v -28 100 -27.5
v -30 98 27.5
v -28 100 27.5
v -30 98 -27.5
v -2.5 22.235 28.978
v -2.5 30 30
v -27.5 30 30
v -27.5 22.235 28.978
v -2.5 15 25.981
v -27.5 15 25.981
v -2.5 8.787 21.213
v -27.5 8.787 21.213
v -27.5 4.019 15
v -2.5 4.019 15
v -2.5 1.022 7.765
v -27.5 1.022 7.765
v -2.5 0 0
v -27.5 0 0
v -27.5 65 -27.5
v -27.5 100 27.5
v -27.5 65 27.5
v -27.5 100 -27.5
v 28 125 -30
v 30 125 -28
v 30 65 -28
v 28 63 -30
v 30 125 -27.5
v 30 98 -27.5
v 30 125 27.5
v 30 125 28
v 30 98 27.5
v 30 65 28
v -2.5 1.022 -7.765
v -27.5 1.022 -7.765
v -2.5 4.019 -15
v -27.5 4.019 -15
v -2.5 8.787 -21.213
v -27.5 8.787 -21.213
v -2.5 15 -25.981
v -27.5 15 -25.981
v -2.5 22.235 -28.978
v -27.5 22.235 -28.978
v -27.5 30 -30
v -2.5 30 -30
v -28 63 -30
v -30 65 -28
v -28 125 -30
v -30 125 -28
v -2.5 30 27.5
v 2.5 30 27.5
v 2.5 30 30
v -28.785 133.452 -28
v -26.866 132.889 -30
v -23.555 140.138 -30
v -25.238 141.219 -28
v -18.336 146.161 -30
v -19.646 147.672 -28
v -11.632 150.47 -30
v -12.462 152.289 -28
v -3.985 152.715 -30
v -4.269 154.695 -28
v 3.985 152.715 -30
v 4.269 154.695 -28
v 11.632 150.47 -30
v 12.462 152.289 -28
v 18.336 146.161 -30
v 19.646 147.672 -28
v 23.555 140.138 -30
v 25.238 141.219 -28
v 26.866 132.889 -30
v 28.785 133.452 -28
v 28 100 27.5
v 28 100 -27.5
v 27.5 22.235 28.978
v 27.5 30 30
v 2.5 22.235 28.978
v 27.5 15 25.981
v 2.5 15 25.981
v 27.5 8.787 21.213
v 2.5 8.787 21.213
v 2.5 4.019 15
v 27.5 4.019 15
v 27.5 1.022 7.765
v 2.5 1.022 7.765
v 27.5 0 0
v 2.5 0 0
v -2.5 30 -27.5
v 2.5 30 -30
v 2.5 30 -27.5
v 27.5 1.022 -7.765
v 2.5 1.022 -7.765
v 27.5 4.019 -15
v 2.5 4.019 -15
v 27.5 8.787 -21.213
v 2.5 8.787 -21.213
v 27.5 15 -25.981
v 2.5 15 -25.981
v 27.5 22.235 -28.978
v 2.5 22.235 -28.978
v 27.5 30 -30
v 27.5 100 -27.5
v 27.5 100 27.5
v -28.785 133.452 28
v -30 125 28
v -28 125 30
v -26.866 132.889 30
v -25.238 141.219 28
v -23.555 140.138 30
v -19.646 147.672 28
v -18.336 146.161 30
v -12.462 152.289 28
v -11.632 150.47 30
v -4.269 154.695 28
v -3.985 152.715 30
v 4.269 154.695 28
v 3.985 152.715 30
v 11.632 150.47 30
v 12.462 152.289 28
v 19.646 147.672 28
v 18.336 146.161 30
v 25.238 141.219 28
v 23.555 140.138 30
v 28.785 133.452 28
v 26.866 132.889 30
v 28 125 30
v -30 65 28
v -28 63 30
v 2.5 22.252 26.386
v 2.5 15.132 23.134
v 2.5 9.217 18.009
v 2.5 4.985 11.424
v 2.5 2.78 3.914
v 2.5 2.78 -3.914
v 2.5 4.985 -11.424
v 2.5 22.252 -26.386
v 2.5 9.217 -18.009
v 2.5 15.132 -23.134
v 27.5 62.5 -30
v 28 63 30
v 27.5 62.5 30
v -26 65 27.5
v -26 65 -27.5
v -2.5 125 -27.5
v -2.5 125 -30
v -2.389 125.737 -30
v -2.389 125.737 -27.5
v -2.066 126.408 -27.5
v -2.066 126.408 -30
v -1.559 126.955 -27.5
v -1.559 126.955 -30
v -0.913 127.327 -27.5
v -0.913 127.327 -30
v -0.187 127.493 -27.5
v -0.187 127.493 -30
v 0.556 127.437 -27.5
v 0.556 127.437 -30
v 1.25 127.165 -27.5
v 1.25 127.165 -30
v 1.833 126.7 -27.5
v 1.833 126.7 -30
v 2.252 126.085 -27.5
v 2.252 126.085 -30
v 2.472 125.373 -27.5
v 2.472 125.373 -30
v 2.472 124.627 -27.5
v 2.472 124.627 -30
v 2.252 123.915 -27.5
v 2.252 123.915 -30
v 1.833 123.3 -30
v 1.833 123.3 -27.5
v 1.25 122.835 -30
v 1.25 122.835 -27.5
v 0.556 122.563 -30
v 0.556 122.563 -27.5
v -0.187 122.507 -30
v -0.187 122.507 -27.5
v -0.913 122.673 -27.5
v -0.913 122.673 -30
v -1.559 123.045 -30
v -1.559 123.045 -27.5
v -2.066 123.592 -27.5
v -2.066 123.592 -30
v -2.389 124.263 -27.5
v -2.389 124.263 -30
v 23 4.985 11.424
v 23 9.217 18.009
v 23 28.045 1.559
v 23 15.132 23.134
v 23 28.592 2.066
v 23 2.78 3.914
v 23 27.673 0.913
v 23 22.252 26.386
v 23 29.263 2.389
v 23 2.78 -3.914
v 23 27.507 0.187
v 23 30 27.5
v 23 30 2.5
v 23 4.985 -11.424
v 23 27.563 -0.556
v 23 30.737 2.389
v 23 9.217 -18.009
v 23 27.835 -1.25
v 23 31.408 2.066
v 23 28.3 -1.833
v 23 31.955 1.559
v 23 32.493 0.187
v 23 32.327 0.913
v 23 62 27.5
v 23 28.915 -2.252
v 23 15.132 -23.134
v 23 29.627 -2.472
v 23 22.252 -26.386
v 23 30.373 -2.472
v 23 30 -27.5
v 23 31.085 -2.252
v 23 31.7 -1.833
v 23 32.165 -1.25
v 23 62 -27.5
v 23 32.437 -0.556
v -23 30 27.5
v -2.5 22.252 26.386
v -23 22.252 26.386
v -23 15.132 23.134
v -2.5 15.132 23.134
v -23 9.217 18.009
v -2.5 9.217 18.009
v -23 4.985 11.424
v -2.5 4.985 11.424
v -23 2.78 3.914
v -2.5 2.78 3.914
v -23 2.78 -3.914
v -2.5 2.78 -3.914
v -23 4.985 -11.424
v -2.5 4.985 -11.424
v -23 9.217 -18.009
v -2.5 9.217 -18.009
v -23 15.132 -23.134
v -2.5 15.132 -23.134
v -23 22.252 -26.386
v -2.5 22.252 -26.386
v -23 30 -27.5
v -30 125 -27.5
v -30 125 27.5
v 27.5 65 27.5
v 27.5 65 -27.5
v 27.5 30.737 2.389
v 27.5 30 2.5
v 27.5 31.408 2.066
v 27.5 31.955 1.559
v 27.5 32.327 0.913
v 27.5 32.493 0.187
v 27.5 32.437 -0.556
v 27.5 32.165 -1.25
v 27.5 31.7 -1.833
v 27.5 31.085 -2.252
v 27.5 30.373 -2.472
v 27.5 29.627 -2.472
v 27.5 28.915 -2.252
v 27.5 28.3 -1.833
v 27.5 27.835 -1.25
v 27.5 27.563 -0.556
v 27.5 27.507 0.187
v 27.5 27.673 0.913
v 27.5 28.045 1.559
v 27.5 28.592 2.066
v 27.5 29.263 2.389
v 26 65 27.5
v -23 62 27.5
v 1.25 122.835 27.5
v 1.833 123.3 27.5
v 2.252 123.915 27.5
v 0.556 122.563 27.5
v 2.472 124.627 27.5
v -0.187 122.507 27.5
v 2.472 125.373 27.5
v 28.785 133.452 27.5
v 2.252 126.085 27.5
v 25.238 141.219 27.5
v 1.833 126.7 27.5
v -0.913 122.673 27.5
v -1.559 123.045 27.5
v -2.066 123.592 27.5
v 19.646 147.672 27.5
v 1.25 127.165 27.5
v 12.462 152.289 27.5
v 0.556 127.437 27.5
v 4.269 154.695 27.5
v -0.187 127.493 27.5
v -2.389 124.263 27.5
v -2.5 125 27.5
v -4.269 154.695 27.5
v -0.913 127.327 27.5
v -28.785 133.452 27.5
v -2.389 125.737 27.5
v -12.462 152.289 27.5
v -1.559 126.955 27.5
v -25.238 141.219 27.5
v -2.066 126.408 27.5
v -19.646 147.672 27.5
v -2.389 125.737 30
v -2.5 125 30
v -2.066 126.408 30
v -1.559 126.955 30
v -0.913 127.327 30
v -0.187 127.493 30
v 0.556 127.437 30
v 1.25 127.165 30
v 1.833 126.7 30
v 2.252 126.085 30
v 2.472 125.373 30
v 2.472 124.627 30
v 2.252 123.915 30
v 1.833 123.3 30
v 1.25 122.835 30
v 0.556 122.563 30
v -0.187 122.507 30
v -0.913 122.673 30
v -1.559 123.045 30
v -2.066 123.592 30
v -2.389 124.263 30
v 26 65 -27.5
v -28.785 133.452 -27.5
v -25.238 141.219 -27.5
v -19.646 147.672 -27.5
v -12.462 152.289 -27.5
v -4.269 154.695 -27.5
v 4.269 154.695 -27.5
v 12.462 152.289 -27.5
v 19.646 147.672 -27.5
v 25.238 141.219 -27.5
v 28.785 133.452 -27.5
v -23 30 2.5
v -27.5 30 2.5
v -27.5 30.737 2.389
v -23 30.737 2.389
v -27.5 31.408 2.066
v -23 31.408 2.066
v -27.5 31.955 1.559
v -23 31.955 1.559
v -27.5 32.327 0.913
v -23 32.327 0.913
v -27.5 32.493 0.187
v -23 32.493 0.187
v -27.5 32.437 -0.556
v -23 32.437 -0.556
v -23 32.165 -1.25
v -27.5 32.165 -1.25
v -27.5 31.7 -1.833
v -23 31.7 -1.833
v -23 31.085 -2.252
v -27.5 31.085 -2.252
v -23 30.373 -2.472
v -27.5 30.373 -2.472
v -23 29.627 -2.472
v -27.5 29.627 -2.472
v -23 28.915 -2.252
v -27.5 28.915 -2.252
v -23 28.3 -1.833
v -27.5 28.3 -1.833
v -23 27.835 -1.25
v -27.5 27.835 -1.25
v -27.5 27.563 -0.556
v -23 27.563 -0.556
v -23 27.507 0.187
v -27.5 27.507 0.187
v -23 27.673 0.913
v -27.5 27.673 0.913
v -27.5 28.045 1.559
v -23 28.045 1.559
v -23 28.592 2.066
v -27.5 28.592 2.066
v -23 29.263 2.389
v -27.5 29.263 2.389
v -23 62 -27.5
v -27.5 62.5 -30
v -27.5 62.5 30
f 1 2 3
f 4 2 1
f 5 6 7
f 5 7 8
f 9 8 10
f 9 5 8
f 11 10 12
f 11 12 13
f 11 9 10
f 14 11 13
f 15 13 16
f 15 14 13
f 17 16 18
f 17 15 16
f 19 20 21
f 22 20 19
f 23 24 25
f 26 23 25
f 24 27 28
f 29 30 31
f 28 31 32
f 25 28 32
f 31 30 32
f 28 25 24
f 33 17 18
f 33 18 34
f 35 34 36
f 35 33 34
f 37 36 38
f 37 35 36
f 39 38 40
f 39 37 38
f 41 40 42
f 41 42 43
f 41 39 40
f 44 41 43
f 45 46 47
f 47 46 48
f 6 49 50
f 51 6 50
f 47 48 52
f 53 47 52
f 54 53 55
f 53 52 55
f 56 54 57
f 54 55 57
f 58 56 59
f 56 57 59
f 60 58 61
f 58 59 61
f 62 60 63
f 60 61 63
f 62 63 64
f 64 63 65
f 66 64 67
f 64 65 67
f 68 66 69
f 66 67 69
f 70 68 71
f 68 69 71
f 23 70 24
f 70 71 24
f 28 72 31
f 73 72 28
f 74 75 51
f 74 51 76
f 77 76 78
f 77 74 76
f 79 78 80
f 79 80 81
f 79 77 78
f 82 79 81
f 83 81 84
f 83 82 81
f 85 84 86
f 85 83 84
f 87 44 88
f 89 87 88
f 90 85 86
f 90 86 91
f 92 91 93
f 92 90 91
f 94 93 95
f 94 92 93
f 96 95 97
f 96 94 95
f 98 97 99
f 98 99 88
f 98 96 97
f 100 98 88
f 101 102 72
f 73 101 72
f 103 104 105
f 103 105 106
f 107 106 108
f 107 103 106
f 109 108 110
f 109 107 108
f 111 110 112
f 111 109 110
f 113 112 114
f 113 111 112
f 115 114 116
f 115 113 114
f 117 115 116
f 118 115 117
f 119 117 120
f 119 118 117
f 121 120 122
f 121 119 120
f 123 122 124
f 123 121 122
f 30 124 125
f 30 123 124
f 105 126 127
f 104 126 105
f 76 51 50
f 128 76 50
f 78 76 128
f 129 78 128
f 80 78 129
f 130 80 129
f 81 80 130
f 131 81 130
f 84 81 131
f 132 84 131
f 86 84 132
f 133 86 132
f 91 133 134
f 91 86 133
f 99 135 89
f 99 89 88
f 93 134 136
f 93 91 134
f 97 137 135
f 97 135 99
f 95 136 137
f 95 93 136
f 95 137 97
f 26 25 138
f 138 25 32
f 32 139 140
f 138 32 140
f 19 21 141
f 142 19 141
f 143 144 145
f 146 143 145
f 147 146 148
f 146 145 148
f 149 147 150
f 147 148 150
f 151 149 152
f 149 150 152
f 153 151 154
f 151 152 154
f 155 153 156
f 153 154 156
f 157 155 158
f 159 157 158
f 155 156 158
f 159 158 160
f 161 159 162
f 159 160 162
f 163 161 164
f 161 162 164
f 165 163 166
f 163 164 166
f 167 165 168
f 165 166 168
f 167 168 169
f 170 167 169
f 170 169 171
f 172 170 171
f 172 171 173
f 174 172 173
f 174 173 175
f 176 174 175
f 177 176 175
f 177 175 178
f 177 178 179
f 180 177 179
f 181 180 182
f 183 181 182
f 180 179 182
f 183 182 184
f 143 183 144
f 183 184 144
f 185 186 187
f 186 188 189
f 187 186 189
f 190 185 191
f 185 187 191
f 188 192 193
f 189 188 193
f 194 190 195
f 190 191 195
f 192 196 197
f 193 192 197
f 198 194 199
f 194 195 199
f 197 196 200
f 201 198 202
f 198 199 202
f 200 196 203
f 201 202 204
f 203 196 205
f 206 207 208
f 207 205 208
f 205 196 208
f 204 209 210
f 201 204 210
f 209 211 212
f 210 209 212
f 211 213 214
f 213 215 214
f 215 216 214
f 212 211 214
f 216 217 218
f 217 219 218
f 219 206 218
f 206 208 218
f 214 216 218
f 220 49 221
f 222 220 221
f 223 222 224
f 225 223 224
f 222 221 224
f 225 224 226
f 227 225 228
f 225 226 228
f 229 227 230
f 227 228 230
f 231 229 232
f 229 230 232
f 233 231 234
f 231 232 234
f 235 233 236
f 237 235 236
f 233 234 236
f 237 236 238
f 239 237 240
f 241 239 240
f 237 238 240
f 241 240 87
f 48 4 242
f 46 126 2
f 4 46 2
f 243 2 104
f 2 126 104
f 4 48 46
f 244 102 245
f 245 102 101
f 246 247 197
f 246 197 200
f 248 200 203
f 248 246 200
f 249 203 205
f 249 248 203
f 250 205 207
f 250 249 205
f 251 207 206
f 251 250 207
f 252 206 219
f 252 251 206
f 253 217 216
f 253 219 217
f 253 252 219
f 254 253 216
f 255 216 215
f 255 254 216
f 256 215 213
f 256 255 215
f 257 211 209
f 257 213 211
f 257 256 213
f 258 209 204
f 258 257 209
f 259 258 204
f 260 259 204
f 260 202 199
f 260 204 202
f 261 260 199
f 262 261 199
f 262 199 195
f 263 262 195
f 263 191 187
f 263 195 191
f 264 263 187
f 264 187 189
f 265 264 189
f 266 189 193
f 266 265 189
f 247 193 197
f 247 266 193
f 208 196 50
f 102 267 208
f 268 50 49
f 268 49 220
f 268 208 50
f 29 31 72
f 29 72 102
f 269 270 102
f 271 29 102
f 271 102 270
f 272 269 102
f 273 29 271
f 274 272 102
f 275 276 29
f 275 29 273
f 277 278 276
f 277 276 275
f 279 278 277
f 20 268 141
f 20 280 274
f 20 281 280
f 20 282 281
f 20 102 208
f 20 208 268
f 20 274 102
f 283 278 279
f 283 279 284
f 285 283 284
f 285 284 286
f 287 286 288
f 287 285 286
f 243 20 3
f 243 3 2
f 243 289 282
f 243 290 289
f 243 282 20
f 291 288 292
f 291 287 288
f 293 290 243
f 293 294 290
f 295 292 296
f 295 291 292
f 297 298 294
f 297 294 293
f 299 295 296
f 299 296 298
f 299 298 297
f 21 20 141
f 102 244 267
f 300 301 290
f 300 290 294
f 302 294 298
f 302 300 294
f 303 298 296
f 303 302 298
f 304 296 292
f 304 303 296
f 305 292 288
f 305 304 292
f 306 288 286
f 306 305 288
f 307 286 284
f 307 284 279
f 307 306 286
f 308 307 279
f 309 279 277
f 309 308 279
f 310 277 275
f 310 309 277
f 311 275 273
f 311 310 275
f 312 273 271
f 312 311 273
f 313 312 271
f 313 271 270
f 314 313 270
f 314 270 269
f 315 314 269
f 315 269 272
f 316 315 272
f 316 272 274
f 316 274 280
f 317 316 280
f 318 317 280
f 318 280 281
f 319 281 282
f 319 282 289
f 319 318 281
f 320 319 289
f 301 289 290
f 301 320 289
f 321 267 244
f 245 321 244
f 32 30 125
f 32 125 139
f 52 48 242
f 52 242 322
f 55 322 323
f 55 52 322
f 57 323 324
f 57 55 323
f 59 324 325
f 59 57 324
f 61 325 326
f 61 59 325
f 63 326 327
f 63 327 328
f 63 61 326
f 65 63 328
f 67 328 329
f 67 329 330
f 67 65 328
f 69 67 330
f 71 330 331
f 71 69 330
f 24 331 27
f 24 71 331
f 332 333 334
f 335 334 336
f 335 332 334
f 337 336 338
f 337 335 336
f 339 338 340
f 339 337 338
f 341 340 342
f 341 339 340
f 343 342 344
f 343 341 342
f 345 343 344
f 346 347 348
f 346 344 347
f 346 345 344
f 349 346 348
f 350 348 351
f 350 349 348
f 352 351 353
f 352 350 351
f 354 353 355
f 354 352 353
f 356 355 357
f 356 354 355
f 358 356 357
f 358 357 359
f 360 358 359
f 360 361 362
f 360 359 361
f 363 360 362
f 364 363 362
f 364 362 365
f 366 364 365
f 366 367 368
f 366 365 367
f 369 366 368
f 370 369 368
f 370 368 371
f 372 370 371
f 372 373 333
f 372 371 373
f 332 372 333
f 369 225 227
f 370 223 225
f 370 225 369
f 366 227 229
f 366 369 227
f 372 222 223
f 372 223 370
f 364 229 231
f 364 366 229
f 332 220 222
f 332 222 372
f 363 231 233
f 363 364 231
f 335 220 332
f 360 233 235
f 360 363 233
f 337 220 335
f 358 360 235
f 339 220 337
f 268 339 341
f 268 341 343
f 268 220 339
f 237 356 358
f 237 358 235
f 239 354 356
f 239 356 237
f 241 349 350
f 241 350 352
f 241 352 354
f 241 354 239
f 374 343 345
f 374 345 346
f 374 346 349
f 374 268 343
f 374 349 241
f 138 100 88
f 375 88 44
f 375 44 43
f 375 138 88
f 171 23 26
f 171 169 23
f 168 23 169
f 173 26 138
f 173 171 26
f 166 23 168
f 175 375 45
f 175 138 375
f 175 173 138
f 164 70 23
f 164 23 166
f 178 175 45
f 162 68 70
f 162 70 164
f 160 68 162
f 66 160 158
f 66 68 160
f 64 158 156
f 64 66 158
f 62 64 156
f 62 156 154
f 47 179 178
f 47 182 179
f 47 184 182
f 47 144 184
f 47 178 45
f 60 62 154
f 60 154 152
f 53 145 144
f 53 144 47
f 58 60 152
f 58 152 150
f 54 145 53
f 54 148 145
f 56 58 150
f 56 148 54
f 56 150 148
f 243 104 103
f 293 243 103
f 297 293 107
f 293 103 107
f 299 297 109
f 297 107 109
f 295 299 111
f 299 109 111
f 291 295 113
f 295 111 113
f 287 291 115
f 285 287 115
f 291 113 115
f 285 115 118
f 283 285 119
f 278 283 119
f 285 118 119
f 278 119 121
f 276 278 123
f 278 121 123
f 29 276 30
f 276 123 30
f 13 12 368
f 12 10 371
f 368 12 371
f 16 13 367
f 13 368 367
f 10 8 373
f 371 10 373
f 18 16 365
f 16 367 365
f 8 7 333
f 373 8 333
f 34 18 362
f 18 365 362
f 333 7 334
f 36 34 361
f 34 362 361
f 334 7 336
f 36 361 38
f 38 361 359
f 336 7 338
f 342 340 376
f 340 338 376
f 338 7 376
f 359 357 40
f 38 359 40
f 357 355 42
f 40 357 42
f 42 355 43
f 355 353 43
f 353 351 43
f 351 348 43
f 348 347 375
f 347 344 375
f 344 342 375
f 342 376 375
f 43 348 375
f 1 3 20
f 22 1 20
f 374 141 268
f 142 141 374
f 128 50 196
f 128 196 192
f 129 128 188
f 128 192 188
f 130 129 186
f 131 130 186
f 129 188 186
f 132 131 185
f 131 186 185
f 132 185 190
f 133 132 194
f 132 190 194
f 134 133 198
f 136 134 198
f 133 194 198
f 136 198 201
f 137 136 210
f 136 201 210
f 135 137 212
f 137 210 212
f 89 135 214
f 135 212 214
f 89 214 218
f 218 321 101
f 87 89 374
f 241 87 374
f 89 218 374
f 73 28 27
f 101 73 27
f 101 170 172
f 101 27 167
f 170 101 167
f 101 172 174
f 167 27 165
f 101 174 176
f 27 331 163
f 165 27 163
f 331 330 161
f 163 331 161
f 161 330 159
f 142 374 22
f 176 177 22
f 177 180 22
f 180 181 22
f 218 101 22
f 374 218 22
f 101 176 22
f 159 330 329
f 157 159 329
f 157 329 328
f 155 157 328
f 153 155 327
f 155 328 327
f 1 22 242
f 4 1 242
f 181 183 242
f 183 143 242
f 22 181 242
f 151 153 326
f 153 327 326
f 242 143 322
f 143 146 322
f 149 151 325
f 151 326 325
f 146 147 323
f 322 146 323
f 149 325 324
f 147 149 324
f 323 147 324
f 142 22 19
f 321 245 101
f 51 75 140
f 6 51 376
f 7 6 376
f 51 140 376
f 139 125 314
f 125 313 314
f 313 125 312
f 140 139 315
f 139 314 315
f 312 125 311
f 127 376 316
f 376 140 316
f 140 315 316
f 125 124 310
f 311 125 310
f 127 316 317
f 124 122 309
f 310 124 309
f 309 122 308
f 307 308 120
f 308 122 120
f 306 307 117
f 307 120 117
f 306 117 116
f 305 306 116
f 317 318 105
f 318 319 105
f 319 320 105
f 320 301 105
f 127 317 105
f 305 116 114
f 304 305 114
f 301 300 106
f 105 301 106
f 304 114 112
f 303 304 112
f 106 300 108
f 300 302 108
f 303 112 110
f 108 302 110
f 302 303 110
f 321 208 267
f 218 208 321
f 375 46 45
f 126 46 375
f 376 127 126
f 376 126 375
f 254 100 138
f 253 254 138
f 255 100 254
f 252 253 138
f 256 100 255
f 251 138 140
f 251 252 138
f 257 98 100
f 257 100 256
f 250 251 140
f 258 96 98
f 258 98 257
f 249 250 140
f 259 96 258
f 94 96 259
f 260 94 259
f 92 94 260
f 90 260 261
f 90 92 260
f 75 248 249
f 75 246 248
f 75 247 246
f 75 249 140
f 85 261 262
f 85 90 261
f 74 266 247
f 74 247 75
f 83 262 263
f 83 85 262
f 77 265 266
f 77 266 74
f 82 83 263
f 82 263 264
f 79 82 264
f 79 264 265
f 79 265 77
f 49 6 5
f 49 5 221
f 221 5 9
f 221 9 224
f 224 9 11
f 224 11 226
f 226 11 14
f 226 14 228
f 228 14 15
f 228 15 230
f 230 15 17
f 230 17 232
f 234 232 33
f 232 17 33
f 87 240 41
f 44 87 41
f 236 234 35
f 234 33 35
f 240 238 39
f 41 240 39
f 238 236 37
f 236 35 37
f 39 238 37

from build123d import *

# Parameters (mm, degrees)
SKETCH1_W               = 60
SKETCH1_H               = 60
BOSS_EXTRUDE1_DEPTH     = 100
SKETCH4_R               = 2.5
BOSS_EXTRUDE2_DEPTH     = 2.5
CUT_EXTRUDE1_DEPTH      = 169.893457541
CUT_EXTRUDE1_DEPTH_BACK = 169.893457541
SKETCH5_R               = 2.5
SKETCH6_W               = 60
SKETCH6_H               = 60
CUT_EXTRUDE2_DEPTH      = 2.5
CHAMFER1_SIZE           = 2
CHAMFER2_SIZE           = 5
SKETCH7_W               = 55
SKETCH7_H               = 55
CUT_EXTRUDE3_DEPTH      = 35
SKETCH8_W               = 46
SKETCH8_H               = 55
CUT_EXTRUDE4_DEPTH      = 35
CUT_EXTRUDE5_DEPTH      = 46
SKETCH10_W              = 5
SKETCH10_H              = 60
CUT_EXTRUDE6_DEPTH      = 30
CHAMFER3_SIZE           = 3


with BuildPart() as part:
    # Sketch1 → Boss-Extrude1 (new body)
    with BuildSketch(Plane(origin=(0, 0, 0), x_dir=(1, 0, 0), z_dir=(0, 1, 0))):
        Rectangle(SKETCH1_W, SKETCH1_H)
    extrude(amount=BOSS_EXTRUDE1_DEPTH)

    # Sketch4 → Boss-Extrude2 (add)
    with BuildSketch(Plane(origin=(0, 0, -30), x_dir=(-1, 0, 0), z_dir=(0, 0, -1))):
        with BuildLine():
            Line((-30, 100), (30, 100))
            Line((30, 100), (30, 125))
            ThreePointArc((30, 125), (0, 155), (-30, 125))
            Line((-30, 125), (-30, 100))
        make_face()
        with Locations((0, 125)):
            Circle(SKETCH4_R, mode=Mode.SUBTRACT)
    boss_extrude2 = extrude(amount=-BOSS_EXTRUDE2_DEPTH)

    # Mirror2: Boss-Extrude2 across plane
    add(boss_extrude2.mirror(Plane.XY))

    # Sketch5 → Cut-Extrude1 (cut, two sides: drawn at the far end of the back side and taken through both)
    with BuildSketch(Plane.ZY.offset(-30).offset(-CUT_EXTRUDE1_DEPTH_BACK)):
        with BuildLine():
            Line((-30, 0), (2.9e-08, 0))
            ThreePointArc((2.9e-08, 0), (-21.213203425, 8.786796554), (-30, 30))
            Line((-30, 30), (-30, 0))
        make_face()
        with BuildLine():
            Line((30, 0), (30, 30))
            ThreePointArc((30, 30), (21.213203446, 8.786796575), (2.9e-08, 0))
            Line((2.9e-08, 0), (30, 0))
        make_face()
        with Locations((0, 30)):
            Circle(SKETCH5_R)
    extrude(amount=CUT_EXTRUDE1_DEPTH + CUT_EXTRUDE1_DEPTH_BACK, mode=Mode.SUBTRACT)

    # Sketch6 → Cut-Extrude2 (cut)
    with BuildSketch(Plane(origin=(30, 0, 0), x_dir=(0, 0, -1), z_dir=(1, 0, 0))):
        with Locations((0, 30)):
            Rectangle(SKETCH6_W, SKETCH6_H)
    cut_extrude2 = extrude(amount=-CUT_EXTRUDE2_DEPTH, mode=Mode.SUBTRACT)

    # Mirror3: Cut-Extrude2 across plane
    add(cut_extrude2.mirror(Plane(origin=(0, 0, 0), x_dir=(0, 0, 1), z_dir=(1, 0, 0))), mode=Mode.SUBTRACT)

    # Chamfer1
    chamfer1_edges = [part.edges().sort_by_distance(p)[0] for p in [
        (-30, 100, 0),
        (0, 155, -30),
        (30, 100, 0),
        (0, 155, 30),
        (30, 92.5, 30),
        (-30, 92.5, 30),
        (-30, 92.5, -30),
        (30, 92.5, -30),
    ]]
    chamfer(chamfer1_edges, length=CHAMFER1_SIZE)

    # Chamfer2
    # the kernel refuses this chamfer: 5 mm, written as the material it takes off along each edge
    with BuildSketch(Plane(origin=(30, 60, 40.85841494), x_dir=(0.027495876610586282, 0.9996219169112968, 0), z_dir=(0, 0, -1))) as chamfer2_piece_1_section:
        Polygon((CHAMFER2_SIZE * 0.999621916911, -CHAMFER2_SIZE * 0.0274958766106), (-CHAMFER2_SIZE * 0.0274958766106, -CHAMFER2_SIZE * 0.999621916911), (0, 0), align=None)
    chamfer2_piece_1 = extrude(amount=81.71682988, mode=Mode.PRIVATE)
    chamfer2_piece_1 = split(chamfer2_piece_1, bisect_by=Plane(origin=(27.5, 61.967005421, 0), z_dir=(1, 0, 0)), keep=Keep.TOP, mode=Mode.PRIVATE)
    add(chamfer2_piece_1, mode=Mode.SUBTRACT)
    with BuildSketch(Plane(origin=(-30, 60, 40.85841494), x_dir=(-0.027495876610586282, 0.9996219169112968, 0), z_dir=(0, 0, -1))) as chamfer2_piece_2_section:
        Polygon((CHAMFER2_SIZE * 0.999621916911, CHAMFER2_SIZE * 0.0274958766106), (-CHAMFER2_SIZE * 0.0274958766106, CHAMFER2_SIZE * 0.999621916911), (0, 0), align=None)
    chamfer2_piece_2 = extrude(amount=81.71682988, mode=Mode.PRIVATE)
    chamfer2_piece_2 = split(chamfer2_piece_2, bisect_by=Plane(origin=(-27.5, 61.967005421, 0), z_dir=(-1, 0, 0)), keep=Keep.TOP, mode=Mode.PRIVATE)
    add(chamfer2_piece_2, mode=Mode.SUBTRACT)

    # Sketch7 → Cut-Extrude3 (cut)
    with BuildSketch(Plane(origin=(0, 100, 0), x_dir=(1, 0, 0), z_dir=(0, 1, 0))):
        Rectangle(SKETCH7_W, SKETCH7_H)
    extrude(amount=-CUT_EXTRUDE3_DEPTH, mode=Mode.SUBTRACT)

    # Sketch8 → Cut-Extrude4 (cut)
    with BuildSketch(Plane(origin=(0, 65, 0), x_dir=(1, 0, 0), z_dir=(0, 1, 0))):
        Rectangle(SKETCH8_W, SKETCH8_H)
    extrude(amount=-CUT_EXTRUDE4_DEPTH, mode=Mode.SUBTRACT)

    # Sketch9 → Cut-Extrude5 (cut)
    with BuildSketch(Plane.ZY.offset(-23)):
        with BuildLine():
            Line((-27.5, 30), (27.5, 30))
            ThreePointArc((27.5, 30), (0, 2.5), (-27.5, 30))
        make_face()
    extrude(amount=CUT_EXTRUDE5_DEPTH, mode=Mode.SUBTRACT)

    # Sketch10 → Cut-Extrude6 (cut)
    with BuildSketch(Plane(origin=(0, 0, 0), x_dir=(1, 0, 0), z_dir=(0, 1, 0))):
        Rectangle(SKETCH10_W, SKETCH10_H)
    extrude(amount=CUT_EXTRUDE6_DEPTH, mode=Mode.SUBTRACT)

    # Chamfer3
    chamfer3_edges = [part.edges().sort_by_distance(p)[0] for p in [
        (23, 65, 0),
        (-23, 65, 0),
    ]]
    chamfer(chamfer3_edges, length=CHAMFER3_SIZE)


solid = part.part
